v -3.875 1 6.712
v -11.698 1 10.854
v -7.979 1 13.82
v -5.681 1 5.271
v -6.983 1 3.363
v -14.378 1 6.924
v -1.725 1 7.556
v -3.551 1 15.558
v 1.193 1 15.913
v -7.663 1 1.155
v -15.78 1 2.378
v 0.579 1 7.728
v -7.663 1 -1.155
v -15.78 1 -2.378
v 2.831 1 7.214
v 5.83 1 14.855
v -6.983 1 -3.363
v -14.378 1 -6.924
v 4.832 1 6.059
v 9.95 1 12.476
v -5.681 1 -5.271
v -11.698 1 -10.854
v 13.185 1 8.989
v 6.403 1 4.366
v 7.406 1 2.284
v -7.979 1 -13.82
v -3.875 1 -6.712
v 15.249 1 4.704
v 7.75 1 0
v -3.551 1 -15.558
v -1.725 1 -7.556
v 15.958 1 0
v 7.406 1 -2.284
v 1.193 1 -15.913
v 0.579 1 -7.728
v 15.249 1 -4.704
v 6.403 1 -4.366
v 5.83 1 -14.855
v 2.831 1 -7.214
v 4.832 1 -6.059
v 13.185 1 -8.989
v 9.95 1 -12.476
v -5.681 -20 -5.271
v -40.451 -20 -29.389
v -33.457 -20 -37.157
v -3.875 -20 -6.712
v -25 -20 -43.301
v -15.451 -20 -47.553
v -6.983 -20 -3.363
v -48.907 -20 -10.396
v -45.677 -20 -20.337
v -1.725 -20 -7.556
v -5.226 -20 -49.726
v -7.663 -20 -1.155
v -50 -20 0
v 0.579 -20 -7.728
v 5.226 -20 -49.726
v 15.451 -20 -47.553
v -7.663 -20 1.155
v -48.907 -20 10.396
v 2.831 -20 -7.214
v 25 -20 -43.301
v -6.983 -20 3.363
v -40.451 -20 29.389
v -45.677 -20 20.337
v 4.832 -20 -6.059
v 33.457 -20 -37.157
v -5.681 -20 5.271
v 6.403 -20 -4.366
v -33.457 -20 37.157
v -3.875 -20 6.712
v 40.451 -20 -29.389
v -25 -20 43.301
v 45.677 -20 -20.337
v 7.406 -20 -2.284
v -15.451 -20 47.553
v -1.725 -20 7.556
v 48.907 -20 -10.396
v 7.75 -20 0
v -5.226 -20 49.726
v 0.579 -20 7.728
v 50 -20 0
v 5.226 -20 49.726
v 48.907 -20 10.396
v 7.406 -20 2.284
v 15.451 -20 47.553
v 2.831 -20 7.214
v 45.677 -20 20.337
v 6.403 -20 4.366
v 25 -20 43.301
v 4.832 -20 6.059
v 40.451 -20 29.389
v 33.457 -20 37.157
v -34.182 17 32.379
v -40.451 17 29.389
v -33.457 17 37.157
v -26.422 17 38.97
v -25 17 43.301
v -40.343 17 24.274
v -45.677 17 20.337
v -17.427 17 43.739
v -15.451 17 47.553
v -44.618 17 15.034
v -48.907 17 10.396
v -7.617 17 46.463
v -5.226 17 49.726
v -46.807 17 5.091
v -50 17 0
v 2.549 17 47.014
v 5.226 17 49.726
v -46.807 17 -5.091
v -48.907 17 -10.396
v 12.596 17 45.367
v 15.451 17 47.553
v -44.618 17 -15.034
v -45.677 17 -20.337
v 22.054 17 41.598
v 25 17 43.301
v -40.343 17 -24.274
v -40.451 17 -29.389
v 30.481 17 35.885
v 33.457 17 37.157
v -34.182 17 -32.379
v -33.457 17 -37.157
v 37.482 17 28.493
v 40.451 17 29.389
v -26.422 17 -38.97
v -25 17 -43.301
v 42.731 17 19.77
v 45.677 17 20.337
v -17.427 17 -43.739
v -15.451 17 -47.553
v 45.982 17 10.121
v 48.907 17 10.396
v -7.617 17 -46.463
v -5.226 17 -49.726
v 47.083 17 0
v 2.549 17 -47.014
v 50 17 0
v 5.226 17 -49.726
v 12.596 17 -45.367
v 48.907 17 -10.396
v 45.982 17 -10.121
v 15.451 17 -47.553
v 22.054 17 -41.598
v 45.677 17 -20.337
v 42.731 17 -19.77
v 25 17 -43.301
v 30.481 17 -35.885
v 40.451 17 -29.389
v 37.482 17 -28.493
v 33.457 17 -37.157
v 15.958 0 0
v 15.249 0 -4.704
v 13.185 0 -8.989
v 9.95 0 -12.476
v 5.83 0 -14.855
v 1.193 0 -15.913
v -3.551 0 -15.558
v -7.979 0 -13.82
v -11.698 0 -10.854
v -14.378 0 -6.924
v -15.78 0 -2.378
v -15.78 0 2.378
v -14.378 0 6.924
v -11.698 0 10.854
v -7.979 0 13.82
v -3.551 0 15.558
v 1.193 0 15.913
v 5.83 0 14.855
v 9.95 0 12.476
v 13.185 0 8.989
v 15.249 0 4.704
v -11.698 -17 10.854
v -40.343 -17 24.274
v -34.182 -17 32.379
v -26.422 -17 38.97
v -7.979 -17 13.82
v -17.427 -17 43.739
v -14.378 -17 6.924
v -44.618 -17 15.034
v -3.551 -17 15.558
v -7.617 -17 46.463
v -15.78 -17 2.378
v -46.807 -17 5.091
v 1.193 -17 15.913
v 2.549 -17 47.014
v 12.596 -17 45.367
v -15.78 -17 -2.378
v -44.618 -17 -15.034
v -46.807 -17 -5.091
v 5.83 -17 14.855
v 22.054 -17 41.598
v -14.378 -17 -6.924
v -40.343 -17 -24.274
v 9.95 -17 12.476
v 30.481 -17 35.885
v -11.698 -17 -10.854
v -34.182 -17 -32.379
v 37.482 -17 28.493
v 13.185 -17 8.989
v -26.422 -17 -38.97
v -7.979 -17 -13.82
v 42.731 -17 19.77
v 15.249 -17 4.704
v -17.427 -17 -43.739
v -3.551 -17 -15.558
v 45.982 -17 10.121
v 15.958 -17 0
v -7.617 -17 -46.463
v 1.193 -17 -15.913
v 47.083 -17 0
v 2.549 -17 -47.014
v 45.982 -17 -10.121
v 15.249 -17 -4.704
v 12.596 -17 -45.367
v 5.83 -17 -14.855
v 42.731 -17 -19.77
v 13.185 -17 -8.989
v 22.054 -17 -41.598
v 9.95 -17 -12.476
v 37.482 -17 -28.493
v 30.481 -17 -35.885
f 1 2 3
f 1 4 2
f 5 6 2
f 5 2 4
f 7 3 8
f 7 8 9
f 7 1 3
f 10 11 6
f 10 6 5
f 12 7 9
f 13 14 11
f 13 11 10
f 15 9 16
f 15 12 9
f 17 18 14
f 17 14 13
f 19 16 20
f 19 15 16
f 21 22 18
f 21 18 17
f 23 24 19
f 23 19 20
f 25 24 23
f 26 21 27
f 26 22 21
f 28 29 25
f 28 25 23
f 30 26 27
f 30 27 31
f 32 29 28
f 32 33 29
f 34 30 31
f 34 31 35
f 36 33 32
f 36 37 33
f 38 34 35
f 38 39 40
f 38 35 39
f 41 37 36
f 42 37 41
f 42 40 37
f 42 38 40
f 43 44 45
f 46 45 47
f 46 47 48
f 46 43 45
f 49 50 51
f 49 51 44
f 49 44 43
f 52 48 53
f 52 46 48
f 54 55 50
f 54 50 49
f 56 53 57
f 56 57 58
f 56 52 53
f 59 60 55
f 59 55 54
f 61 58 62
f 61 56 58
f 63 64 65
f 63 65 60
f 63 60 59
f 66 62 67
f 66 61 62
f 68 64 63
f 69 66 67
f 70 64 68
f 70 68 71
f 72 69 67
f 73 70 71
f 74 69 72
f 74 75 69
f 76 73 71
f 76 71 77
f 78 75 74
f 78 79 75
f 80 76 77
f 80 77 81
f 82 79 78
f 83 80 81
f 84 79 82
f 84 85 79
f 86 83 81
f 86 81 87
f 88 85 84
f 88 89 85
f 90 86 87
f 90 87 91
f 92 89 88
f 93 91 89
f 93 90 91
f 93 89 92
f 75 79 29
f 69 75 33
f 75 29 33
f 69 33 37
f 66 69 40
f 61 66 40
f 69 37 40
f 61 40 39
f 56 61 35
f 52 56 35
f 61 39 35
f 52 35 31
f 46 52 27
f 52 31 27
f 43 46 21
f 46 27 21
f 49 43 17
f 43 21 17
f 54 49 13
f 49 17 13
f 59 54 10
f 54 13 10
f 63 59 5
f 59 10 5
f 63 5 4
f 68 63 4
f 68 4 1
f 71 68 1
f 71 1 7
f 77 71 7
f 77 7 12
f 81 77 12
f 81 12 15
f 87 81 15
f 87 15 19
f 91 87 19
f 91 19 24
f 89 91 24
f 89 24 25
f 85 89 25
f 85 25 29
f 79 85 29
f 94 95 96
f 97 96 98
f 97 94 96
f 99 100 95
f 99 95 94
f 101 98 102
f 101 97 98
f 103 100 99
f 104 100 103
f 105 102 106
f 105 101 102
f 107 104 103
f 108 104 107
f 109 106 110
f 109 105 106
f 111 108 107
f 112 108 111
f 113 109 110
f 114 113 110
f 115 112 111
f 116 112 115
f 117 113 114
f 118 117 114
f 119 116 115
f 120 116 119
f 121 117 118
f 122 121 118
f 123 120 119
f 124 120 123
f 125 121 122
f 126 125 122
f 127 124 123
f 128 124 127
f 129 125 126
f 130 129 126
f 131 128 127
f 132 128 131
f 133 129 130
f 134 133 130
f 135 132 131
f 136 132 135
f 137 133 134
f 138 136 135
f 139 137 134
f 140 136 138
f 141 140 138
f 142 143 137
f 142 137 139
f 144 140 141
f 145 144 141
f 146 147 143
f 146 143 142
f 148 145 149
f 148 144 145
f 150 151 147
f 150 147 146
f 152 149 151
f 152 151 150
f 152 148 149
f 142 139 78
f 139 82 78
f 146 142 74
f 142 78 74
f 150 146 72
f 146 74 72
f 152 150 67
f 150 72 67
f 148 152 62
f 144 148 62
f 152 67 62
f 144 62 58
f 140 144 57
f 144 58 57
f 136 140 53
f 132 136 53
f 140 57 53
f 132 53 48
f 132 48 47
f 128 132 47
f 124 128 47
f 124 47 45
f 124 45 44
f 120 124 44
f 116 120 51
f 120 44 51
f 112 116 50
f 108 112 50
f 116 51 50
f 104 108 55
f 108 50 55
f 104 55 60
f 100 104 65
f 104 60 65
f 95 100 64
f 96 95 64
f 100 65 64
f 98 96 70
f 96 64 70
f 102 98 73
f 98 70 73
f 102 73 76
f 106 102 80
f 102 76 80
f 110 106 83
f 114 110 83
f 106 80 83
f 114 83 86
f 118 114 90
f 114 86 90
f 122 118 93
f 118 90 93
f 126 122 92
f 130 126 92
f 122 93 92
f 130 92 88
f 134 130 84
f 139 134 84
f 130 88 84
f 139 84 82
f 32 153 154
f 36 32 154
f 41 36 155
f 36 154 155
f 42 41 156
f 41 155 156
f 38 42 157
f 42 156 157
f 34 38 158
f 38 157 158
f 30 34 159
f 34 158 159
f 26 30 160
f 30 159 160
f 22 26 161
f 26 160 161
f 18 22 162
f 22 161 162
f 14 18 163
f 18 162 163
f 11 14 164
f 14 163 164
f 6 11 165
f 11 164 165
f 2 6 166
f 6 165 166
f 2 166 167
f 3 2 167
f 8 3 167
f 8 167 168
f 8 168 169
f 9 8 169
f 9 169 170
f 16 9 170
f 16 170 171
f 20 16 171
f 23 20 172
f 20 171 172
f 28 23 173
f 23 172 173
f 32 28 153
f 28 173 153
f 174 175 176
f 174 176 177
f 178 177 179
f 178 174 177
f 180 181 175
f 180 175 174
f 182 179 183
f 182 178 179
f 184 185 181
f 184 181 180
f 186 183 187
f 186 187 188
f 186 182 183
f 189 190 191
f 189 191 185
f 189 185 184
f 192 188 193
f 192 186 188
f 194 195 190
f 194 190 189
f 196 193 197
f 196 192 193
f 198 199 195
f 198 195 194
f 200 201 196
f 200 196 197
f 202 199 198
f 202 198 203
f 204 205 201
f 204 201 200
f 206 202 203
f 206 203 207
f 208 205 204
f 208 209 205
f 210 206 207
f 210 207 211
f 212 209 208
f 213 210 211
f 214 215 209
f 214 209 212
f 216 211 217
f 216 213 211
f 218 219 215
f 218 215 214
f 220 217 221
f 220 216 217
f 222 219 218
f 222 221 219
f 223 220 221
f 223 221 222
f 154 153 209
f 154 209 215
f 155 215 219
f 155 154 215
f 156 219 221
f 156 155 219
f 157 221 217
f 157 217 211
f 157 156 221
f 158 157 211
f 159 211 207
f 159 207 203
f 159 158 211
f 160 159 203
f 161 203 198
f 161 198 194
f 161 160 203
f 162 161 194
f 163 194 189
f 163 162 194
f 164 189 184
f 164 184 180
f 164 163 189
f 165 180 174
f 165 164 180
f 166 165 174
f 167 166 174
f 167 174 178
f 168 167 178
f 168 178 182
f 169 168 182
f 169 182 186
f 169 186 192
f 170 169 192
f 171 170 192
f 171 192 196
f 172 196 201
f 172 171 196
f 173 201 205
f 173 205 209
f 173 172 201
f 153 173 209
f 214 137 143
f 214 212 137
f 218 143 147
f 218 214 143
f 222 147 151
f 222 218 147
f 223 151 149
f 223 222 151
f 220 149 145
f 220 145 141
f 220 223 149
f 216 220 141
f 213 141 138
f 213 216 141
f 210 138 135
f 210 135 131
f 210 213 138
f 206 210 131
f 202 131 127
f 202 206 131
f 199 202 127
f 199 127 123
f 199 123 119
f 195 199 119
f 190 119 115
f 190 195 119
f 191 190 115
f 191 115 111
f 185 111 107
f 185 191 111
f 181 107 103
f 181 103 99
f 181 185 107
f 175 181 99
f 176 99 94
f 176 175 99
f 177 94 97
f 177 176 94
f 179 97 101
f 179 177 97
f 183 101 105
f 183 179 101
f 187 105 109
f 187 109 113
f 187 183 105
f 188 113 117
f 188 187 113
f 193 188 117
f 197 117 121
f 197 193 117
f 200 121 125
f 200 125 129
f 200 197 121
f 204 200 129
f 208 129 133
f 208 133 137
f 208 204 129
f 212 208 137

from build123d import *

# Parameters (mm, degrees)
SKETCH1_R                      = 15.958
SHAFTHOLDERNEARMOTOR_DEPTH     = 1
SKETCH2_R                      = 3.4
CUT_EXTRUDE1_DEPTH             = 16.85
SKETCH10_R                     = 50
BOSS_EXTRUDE4_DEPTH            = 20
SKETCH12_R                     = 47.082764373
SKETCH12_R_2                   = 15.95790089
CUTTOREMVEEXCESSMATERIAL_DEPTH = 17
SKETCH13_R                     = 50
SKETCH13_R_2                   = 47.082764373
BOSS_EXTRUDE5_DEPTH            = 17
SKETCH32_R                     = 7.75
CUT_EXTRUDE2_DEPTH             = 22


with BuildPart() as part:
    # Sketch1 → ShaftHolderNearMotor (new body)
    with BuildSketch(Plane(origin=(0, 0, 0), x_dir=(1, 0, 0), z_dir=(0, 1, 0))):
        Circle(SKETCH1_R)
    extrude(amount=SHAFTHOLDERNEARMOTOR_DEPTH)

    # Sketch2 → Cut-Extrude1 (cut)
    with BuildSketch(Plane(origin=(0, 1, 0), x_dir=(1, 0, 0), z_dir=(0, 1, 0))):
        Circle(SKETCH2_R)
    extrude(amount=-CUT_EXTRUDE1_DEPTH, mode=Mode.SUBTRACT)

    # Sketch10 → Boss-Extrude4 (add)
    with BuildSketch(Plane.XZ):
        Circle(SKETCH10_R)
    extrude(amount=BOSS_EXTRUDE4_DEPTH)

    # Sketch12 → CutToRemveExcessMaterial (cut)
    with BuildSketch(Plane(origin=(0, 0, 0), x_dir=(1, 0, 0), z_dir=(0, 1, 0))):
        Circle(SKETCH12_R)
        Circle(SKETCH12_R_2, mode=Mode.SUBTRACT)
    extrude(amount=-CUTTOREMVEEXCESSMATERIAL_DEPTH, mode=Mode.SUBTRACT)

    # Sketch13 → Boss-Extrude5 (add)
    with BuildSketch(Plane(origin=(0, 0, 0), x_dir=(1, 0, 0), z_dir=(0, 1, 0))):
        Circle(SKETCH13_R)
        Circle(SKETCH13_R_2, mode=Mode.SUBTRACT)
    extrude(amount=BOSS_EXTRUDE5_DEPTH)

    # Sketch32 → Cut-Extrude2 (cut, through all)
    with BuildSketch(Plane(origin=(0, 1, 0), x_dir=(1, 0, 0), z_dir=(0, 1, 0))):
        Circle(SKETCH32_R)
    extrude(amount=-CUT_EXTRUDE2_DEPTH, mode=Mode.SUBTRACT)


solid = part.part
